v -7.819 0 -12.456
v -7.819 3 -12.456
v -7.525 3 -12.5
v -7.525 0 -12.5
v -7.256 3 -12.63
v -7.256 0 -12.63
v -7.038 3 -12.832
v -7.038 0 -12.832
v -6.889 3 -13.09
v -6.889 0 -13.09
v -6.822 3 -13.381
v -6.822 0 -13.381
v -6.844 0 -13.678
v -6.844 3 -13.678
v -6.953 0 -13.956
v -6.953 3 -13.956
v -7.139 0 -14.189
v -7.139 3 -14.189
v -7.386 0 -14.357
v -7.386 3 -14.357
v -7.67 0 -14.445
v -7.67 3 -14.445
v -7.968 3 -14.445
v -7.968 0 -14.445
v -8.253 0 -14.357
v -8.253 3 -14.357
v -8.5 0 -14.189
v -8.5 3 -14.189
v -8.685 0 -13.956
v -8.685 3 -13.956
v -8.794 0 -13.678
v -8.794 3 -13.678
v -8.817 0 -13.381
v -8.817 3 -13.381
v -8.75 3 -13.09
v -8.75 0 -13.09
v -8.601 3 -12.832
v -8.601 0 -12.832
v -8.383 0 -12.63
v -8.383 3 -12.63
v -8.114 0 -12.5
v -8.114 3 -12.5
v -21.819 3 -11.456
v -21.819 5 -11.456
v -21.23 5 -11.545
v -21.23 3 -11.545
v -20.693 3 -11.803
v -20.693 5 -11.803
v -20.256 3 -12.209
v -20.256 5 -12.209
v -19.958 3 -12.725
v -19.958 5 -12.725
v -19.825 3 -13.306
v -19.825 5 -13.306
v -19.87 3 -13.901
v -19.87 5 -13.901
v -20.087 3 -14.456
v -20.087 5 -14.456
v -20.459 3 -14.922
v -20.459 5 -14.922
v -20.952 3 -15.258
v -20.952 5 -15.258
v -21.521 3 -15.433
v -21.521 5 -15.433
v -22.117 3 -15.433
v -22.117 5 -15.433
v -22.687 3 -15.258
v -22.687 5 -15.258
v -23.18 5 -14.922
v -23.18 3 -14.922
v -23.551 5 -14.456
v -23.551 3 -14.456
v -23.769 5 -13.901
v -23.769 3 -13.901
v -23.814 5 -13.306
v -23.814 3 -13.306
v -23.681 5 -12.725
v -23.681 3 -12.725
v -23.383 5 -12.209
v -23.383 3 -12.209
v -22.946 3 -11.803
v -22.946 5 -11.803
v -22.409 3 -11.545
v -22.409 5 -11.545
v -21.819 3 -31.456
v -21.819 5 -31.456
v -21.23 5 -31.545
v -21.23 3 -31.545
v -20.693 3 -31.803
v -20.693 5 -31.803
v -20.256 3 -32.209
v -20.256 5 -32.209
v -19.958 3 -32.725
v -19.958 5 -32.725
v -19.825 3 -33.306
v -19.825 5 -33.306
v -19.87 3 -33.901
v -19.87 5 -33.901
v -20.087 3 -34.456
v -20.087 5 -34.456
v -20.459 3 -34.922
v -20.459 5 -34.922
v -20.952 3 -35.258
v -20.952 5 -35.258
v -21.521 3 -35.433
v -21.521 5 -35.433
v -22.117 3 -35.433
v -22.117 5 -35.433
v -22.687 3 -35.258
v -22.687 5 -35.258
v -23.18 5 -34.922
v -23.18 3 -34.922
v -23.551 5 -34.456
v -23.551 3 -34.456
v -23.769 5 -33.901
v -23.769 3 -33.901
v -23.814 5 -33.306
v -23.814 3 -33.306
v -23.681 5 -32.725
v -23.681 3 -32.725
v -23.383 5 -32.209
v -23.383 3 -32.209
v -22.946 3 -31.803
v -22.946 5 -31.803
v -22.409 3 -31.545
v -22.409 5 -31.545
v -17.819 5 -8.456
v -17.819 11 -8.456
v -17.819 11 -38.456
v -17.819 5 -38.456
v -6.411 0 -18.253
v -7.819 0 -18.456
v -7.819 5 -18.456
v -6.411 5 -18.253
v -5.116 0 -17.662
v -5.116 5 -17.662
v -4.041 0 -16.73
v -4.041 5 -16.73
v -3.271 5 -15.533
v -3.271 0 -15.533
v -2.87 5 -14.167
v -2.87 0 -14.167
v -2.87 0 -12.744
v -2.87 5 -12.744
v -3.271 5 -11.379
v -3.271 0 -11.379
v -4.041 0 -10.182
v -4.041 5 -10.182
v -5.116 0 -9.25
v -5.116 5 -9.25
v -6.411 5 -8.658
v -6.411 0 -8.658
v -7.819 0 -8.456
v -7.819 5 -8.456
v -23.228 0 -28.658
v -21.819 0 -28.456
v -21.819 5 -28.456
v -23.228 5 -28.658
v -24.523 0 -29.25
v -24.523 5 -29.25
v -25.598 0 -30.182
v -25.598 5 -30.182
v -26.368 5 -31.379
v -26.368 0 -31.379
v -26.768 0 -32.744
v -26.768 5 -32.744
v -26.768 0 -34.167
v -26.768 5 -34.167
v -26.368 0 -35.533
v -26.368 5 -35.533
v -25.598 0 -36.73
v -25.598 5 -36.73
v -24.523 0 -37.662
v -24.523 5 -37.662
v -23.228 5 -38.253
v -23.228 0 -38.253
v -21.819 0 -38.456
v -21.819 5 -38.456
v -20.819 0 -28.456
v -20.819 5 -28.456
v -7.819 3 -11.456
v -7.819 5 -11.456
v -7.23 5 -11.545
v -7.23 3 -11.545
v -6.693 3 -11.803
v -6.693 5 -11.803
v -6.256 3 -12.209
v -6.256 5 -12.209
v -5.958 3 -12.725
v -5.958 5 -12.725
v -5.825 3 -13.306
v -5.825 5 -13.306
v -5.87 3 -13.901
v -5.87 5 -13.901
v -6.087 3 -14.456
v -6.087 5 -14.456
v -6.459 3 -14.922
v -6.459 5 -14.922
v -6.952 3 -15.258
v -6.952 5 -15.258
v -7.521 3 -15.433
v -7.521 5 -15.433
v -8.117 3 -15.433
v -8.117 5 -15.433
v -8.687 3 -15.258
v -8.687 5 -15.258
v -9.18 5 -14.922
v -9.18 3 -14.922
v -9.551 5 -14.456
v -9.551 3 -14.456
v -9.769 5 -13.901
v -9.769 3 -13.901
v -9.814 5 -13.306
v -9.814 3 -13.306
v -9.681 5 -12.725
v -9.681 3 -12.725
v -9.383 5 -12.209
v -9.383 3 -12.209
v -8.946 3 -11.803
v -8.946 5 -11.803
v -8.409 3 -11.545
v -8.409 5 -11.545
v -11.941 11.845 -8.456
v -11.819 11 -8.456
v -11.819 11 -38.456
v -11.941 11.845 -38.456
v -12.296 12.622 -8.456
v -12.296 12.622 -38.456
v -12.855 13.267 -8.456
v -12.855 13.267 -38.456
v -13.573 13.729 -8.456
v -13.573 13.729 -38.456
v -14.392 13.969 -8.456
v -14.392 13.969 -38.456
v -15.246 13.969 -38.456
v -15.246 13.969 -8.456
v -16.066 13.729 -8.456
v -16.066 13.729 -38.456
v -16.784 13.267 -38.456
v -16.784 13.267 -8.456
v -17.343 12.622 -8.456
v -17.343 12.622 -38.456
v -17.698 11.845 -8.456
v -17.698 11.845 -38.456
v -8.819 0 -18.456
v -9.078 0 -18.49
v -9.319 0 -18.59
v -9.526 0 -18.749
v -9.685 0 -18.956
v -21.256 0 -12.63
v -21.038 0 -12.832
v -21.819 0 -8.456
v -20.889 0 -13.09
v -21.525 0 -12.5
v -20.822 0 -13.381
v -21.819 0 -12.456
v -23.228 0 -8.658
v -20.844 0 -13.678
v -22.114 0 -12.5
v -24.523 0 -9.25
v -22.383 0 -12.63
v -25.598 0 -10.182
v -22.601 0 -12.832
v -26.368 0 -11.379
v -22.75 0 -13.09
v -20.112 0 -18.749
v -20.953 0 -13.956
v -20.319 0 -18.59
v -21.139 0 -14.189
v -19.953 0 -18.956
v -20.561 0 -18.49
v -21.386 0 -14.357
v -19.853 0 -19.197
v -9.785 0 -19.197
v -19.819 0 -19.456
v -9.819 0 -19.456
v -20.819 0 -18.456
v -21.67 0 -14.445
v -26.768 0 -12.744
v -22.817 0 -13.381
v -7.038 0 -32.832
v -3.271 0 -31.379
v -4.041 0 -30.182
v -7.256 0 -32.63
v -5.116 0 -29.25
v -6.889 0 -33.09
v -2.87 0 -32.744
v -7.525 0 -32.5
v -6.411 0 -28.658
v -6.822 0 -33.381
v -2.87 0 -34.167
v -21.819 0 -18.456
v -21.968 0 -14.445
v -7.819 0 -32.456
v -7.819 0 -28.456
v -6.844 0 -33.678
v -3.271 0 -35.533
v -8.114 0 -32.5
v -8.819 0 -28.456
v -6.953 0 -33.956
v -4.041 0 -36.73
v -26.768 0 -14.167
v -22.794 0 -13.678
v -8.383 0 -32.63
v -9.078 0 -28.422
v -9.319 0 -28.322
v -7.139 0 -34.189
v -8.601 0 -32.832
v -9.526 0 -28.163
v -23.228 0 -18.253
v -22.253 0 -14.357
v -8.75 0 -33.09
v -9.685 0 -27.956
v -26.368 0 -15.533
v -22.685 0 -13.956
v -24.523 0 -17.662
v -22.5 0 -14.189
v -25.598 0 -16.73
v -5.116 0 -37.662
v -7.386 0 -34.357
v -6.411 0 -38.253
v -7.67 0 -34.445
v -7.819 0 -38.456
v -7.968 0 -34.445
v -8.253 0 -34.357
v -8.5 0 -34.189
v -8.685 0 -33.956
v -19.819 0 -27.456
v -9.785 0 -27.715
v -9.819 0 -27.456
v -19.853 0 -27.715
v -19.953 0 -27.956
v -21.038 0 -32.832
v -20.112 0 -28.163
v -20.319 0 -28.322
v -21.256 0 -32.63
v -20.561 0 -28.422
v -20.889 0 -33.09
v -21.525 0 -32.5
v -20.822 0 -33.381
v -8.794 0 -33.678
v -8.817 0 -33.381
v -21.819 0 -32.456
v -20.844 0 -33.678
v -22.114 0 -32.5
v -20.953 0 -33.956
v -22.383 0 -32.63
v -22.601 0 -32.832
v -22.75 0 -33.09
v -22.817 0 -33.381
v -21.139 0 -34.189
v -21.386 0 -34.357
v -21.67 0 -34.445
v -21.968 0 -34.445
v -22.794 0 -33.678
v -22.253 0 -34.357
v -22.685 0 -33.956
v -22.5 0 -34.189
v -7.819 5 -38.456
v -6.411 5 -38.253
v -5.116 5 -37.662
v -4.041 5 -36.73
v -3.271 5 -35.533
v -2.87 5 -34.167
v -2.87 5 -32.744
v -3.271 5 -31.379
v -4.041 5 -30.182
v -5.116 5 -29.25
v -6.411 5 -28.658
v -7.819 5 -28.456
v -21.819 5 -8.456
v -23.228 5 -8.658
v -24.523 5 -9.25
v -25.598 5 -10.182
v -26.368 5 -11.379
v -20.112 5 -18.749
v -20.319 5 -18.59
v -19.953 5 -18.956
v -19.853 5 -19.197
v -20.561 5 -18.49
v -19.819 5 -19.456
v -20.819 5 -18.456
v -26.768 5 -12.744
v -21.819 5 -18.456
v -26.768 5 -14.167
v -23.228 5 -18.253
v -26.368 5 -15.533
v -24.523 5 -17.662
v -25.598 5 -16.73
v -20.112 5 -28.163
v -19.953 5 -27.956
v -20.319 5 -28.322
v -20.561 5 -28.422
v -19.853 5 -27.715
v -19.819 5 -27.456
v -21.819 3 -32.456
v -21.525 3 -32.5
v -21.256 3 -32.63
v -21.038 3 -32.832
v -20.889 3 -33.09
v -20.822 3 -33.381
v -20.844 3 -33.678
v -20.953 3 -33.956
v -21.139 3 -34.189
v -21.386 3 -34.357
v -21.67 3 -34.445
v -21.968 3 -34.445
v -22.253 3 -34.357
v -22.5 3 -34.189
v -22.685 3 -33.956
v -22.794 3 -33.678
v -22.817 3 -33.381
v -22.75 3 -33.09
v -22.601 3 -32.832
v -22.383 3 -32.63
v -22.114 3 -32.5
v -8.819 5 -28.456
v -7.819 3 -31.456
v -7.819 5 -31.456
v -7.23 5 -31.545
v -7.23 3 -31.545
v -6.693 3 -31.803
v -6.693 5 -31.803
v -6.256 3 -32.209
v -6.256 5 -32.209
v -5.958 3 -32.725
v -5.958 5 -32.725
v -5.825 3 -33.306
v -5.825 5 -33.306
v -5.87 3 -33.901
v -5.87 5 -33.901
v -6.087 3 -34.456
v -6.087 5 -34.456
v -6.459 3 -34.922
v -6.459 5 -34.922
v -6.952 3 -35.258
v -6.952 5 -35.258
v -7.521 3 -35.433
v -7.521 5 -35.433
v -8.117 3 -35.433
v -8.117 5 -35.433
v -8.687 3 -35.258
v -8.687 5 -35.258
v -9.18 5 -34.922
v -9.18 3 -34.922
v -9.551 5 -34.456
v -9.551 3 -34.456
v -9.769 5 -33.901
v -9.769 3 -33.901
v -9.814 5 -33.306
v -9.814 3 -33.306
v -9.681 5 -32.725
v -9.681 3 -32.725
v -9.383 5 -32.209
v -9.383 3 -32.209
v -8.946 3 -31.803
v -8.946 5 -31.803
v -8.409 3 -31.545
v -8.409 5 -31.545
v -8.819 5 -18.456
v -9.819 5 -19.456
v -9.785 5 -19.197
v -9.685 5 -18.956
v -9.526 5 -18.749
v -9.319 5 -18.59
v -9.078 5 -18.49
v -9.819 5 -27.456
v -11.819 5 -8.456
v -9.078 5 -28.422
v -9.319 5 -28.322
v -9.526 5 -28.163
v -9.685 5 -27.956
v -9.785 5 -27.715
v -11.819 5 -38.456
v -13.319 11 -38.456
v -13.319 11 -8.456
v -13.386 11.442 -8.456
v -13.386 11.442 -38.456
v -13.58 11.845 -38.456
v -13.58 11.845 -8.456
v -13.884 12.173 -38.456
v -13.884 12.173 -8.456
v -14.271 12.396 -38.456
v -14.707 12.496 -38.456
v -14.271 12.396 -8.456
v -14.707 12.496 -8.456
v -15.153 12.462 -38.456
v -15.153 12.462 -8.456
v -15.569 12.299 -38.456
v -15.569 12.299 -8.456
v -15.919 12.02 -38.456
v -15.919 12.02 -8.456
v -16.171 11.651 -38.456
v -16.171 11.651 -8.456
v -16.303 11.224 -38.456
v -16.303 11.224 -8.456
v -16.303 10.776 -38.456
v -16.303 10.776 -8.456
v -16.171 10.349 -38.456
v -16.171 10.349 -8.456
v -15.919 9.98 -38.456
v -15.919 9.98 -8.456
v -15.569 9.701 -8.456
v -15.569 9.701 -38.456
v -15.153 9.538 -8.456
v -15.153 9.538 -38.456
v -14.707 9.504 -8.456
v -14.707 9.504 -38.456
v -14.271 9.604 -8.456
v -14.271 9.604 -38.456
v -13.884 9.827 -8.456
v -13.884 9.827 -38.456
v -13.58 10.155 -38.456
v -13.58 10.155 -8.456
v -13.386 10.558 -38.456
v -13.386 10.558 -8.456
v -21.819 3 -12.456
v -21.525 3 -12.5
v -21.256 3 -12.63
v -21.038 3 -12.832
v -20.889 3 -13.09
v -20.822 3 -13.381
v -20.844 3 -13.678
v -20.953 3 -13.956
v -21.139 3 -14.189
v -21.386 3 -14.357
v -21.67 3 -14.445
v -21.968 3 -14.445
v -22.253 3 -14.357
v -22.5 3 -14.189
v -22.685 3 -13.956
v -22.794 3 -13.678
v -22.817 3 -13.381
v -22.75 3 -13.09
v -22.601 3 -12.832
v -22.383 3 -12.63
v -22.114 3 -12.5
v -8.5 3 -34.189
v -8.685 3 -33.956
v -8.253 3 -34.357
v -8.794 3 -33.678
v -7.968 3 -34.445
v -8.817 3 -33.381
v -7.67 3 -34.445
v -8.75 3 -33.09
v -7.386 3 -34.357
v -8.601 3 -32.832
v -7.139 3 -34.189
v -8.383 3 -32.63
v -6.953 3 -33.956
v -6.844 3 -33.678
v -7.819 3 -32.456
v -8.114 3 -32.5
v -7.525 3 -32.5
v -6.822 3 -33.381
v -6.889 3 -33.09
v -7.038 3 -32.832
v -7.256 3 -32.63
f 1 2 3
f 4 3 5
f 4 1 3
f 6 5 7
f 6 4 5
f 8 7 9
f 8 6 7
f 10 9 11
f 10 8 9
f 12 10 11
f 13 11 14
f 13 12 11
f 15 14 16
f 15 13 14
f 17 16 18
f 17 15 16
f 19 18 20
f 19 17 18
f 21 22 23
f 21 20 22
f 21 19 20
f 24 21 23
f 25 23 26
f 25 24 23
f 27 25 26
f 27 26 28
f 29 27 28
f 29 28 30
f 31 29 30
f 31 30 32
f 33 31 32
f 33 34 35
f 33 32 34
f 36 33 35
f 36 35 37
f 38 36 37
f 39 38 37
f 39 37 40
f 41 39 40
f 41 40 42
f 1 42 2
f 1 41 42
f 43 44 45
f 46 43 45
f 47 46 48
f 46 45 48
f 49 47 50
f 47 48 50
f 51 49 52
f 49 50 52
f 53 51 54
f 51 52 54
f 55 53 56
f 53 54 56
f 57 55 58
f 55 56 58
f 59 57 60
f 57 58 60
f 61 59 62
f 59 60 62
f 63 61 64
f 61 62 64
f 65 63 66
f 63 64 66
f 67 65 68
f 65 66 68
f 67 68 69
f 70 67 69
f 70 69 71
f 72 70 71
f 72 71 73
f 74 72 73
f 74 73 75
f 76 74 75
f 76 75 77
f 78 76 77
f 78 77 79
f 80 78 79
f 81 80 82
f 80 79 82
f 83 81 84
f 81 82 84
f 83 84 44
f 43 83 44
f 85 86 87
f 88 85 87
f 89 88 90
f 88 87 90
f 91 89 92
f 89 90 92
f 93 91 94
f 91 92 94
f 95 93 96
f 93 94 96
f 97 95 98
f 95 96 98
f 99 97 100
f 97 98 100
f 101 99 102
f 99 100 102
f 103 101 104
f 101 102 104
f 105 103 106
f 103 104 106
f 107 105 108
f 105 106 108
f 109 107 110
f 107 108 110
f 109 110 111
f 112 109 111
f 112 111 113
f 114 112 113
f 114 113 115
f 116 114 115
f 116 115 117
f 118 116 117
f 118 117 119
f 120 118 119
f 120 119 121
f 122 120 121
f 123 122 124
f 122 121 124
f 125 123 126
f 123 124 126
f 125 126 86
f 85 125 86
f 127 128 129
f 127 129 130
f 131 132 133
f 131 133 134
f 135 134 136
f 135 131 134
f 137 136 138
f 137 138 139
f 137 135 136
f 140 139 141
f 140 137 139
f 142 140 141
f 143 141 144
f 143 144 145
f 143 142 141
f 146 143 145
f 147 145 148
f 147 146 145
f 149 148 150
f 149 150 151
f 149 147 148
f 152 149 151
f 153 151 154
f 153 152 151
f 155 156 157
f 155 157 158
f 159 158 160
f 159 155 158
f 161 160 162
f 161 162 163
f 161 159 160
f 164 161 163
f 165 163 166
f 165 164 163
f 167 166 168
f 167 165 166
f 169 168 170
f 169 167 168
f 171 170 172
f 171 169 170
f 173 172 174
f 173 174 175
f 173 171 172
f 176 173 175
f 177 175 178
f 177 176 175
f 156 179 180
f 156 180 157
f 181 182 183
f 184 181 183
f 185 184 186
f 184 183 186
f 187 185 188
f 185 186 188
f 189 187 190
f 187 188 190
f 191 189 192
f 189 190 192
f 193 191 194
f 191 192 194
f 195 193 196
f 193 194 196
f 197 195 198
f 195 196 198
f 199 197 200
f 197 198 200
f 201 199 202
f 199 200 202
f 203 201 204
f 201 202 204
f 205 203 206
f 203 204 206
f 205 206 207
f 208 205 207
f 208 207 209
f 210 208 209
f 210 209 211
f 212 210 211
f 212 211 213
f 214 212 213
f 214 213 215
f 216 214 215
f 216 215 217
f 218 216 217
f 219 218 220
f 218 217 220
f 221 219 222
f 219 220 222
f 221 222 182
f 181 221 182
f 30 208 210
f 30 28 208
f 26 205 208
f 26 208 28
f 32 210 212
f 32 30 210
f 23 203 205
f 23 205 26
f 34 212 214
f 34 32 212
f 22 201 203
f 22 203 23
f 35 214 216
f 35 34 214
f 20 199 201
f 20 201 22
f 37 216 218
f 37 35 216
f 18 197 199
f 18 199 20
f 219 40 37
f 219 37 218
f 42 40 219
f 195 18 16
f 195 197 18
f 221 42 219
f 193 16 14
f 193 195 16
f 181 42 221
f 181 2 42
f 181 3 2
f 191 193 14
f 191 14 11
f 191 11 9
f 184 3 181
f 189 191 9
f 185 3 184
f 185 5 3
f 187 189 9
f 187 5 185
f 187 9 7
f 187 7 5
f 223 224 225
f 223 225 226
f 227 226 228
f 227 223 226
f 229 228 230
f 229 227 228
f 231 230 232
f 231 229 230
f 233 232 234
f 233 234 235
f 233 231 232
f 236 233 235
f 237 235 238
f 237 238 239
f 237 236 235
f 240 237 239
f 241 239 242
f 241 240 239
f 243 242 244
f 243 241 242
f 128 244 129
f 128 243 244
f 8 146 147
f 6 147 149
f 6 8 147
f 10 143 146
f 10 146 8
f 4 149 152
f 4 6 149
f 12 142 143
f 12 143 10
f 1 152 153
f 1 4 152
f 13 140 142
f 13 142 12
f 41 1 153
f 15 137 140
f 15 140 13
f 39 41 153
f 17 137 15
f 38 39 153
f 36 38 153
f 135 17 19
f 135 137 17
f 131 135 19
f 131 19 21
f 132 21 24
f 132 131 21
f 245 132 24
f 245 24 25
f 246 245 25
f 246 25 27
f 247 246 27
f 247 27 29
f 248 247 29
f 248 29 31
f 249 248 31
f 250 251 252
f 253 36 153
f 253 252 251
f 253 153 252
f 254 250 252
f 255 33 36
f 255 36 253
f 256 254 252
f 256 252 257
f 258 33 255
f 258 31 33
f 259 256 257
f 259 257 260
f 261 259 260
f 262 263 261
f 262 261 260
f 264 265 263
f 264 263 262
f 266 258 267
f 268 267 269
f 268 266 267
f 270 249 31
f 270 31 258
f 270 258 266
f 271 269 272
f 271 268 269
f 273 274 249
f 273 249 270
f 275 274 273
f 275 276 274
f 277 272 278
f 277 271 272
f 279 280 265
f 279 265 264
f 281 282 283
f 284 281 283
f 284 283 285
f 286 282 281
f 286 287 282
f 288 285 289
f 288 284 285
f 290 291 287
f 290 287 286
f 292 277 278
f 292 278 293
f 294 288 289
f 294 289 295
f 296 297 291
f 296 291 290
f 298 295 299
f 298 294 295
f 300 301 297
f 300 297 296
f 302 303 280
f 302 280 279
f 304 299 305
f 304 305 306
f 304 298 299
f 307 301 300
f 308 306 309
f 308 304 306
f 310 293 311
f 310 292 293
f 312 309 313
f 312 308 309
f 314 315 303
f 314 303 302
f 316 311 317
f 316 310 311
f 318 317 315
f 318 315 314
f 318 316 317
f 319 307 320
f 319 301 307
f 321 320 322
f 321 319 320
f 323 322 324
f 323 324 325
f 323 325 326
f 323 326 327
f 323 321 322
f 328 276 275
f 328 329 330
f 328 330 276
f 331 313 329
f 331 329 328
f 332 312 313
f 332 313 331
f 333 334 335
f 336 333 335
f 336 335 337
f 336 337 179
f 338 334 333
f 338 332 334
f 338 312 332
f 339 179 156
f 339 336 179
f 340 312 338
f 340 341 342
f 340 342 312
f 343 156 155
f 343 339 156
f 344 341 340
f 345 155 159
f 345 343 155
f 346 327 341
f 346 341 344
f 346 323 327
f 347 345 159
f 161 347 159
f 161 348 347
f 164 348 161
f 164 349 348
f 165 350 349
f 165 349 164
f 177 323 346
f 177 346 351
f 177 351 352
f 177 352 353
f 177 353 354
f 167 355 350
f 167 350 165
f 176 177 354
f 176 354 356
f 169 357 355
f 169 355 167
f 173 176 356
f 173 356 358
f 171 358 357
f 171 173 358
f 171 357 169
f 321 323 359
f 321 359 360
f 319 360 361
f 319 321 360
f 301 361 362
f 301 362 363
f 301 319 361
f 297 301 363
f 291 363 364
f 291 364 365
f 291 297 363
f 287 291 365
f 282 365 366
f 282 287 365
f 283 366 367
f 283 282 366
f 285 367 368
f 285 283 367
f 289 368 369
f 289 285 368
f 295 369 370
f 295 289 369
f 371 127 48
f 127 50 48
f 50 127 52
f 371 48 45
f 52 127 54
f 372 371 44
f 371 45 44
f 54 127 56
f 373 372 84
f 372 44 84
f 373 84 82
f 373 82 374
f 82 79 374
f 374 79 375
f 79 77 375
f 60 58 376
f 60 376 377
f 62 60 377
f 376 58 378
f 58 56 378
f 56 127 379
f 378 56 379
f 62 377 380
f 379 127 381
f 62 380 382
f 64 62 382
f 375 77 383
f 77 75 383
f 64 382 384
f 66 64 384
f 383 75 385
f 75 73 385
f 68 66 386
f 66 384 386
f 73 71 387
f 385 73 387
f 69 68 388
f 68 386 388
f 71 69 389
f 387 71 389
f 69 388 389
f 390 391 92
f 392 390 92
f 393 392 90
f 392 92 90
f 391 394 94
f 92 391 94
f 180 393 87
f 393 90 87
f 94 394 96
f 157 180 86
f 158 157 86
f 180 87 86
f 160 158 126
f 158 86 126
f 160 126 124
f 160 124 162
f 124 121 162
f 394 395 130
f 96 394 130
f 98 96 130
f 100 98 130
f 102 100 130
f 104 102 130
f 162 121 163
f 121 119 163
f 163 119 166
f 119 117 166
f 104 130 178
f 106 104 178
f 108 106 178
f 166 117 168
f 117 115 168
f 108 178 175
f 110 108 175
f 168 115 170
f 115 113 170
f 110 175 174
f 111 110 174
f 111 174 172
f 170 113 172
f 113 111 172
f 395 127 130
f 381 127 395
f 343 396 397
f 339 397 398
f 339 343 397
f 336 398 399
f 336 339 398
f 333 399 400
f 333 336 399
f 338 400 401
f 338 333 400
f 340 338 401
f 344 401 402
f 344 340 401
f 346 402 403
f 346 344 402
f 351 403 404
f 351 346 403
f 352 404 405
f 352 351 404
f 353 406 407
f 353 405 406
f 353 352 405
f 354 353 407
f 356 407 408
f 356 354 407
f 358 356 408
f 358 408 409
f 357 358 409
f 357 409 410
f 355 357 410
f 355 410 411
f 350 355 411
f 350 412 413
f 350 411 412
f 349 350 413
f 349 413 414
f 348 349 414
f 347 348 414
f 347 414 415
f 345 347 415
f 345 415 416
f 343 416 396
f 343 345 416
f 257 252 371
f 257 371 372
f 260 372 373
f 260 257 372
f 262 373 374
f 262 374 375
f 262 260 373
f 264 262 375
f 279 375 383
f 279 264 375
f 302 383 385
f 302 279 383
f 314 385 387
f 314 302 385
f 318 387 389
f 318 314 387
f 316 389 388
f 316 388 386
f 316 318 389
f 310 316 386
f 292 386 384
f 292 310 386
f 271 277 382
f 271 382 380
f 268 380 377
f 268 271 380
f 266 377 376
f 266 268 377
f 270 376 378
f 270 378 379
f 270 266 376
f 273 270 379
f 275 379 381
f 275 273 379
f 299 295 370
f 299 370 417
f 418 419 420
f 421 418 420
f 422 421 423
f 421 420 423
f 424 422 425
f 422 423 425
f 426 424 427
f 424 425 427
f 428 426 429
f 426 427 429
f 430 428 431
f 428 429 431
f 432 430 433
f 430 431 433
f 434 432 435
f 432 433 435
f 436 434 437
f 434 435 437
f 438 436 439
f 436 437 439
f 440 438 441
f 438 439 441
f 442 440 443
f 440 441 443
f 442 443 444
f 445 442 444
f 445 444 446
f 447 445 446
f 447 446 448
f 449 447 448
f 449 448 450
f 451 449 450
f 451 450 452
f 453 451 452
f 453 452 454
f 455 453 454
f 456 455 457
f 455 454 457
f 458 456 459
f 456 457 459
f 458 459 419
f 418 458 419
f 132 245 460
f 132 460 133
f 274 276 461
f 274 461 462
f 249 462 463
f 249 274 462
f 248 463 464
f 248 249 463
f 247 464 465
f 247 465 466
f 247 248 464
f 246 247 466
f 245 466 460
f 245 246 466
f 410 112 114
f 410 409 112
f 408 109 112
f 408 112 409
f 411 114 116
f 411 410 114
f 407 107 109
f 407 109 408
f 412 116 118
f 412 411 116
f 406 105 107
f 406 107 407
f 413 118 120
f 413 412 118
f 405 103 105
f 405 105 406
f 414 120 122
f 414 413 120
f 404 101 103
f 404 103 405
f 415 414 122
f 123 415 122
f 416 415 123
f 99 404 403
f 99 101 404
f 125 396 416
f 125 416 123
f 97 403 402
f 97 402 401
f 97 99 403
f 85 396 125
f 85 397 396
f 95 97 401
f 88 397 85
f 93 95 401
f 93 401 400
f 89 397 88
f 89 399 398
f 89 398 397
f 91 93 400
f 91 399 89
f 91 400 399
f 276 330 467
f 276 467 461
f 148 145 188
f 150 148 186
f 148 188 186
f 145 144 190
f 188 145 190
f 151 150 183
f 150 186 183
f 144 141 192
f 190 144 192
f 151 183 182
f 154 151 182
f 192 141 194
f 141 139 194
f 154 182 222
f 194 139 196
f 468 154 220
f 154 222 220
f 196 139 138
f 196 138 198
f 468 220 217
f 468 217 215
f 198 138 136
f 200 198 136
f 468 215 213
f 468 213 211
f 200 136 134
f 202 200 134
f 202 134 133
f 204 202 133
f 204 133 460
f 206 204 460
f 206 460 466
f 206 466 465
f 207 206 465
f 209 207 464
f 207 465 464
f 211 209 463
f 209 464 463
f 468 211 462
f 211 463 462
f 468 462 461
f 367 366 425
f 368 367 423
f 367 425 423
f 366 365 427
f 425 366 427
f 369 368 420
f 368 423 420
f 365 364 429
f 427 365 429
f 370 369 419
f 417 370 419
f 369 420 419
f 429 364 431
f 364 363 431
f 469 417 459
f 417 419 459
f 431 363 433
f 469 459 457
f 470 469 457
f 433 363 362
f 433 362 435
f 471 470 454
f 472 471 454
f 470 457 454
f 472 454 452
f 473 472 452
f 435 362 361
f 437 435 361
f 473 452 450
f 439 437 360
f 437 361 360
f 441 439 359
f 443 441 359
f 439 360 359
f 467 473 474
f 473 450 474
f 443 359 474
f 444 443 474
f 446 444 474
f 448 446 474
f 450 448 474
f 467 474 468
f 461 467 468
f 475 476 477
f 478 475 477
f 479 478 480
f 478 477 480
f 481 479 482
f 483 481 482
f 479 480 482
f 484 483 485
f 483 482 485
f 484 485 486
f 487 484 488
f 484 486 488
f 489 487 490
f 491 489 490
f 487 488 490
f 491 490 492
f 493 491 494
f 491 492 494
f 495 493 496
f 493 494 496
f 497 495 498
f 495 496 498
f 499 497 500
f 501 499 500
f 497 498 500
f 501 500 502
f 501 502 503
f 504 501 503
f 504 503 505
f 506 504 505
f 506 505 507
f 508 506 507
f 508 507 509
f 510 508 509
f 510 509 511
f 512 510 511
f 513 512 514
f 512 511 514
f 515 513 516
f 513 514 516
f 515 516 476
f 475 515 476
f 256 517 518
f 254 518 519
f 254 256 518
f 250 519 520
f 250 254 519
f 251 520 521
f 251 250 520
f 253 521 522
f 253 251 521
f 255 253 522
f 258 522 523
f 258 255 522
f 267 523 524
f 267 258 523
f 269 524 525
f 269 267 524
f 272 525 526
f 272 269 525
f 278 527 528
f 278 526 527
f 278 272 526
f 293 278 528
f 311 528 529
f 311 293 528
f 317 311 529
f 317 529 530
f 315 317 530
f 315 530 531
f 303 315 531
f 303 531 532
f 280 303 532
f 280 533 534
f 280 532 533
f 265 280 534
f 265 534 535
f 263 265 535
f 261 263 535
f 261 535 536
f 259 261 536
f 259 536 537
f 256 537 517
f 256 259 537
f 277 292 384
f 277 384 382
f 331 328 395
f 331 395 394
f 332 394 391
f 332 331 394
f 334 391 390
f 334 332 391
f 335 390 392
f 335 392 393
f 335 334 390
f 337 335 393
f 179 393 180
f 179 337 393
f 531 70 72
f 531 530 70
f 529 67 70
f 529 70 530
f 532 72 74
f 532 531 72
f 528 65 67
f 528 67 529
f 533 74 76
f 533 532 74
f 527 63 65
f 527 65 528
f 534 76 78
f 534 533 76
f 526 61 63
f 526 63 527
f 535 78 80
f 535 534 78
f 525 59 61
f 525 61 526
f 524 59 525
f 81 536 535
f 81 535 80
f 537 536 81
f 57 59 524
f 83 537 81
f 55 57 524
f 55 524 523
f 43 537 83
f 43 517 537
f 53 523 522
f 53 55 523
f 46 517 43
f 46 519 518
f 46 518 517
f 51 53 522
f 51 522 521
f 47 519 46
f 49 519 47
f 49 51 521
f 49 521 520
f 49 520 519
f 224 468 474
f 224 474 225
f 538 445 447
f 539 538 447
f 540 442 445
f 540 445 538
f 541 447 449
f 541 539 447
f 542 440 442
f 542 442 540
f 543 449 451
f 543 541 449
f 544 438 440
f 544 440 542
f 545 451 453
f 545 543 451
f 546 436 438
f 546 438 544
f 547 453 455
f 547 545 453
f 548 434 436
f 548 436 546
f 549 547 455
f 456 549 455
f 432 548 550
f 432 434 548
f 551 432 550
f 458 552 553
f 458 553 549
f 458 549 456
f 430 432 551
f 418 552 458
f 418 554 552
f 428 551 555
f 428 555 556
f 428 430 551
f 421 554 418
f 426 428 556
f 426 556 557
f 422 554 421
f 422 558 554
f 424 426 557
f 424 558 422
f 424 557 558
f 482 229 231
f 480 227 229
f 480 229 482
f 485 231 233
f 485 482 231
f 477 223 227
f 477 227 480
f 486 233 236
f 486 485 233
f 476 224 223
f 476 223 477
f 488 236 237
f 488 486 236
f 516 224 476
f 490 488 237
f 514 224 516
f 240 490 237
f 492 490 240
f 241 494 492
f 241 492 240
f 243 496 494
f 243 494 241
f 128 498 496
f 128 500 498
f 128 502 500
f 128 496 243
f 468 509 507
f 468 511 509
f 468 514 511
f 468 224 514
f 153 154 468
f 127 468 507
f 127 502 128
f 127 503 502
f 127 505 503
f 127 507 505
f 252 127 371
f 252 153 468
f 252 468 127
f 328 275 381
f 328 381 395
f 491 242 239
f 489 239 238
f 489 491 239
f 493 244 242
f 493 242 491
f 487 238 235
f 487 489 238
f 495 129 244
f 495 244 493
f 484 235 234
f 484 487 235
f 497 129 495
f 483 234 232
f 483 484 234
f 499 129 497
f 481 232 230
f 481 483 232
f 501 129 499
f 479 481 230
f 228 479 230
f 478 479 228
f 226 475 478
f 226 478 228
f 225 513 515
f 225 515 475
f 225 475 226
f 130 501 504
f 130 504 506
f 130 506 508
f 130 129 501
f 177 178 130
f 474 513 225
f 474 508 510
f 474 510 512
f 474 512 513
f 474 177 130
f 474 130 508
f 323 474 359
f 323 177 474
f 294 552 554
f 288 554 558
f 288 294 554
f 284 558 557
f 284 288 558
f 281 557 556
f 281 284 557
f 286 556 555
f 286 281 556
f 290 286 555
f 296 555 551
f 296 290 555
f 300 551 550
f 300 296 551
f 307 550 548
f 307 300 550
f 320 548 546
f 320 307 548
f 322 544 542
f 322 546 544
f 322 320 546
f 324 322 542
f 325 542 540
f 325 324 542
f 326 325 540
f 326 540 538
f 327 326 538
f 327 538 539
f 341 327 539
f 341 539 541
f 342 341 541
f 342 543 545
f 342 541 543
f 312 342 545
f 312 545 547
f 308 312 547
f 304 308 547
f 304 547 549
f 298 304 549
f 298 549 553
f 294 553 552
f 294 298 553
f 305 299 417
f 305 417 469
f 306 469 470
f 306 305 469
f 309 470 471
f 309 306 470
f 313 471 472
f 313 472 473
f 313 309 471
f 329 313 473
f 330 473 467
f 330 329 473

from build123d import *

# Parameters (mm, degrees)
SKETCH_1_R          = 1
EXTRUDE_1_DEPTH     = 5
SKETCH_7_R          = 1.5
EXTRUDE_3_DEPTH     = 30
SKETCH_8_R          = 2
CUT_EXTRUDE_1_DEPTH = 2


with BuildPart() as part:
    # 草图1 → 凸台-拉伸1 (new body)
    with BuildSketch(Plane(origin=(0, 0, 0), x_dir=(1, 0, 0), z_dir=(0, 1, 0))):
        with BuildLine():
            Line((-21.819389518, 18.45581381), (-20.819389518, 18.45581381))
            ThreePointArc((-20.819389518, 18.45581381), (-20.112282737, 18.748707029), (-19.819389518, 19.45581381))
            Line((-19.819389518, 19.45581381), (-19.819389518, 27.45581381))
            ThreePointArc((-19.819389518, 27.45581381), (-20.112282737, 28.162920591), (-20.819389518, 28.45581381))
            Line((-20.819389518, 28.45581381), (-21.819389518, 28.45581381))
            ThreePointArc((-21.819389518, 28.45581381), (-26.819389518, 33.45581381), (-21.819389518, 38.45581381))
            Line((-21.819389518, 38.45581381), (-7.819389518, 38.45581381))
            ThreePointArc((-7.819389518, 38.45581381), (-2.819389518, 33.45581381), (-7.819389518, 28.45581381))
            Line((-7.819389518, 28.45581381), (-8.819389518, 28.45581381))
            ThreePointArc((-8.819389518, 28.45581381), (-9.526496299, 28.162920591), (-9.819389518, 27.45581381))
            Line((-9.819389518, 27.45581381), (-9.819389518, 19.45581381))
            ThreePointArc((-9.819389518, 19.45581381), (-9.526496299, 18.748707029), (-8.819389518, 18.45581381))
            Line((-8.819389518, 18.45581381), (-7.819389518, 18.45581381))
            ThreePointArc((-7.819389518, 18.45581381), (-2.819389518, 13.45581381), (-7.819389518, 8.45581381))
            Line((-7.819389518, 8.45581381), (-21.819389518, 8.45581381))
            ThreePointArc((-21.819389518, 8.45581381), (-26.819389518, 13.45581381), (-21.819389518, 18.45581381))
        make_face()
        with Locations(Location((-21.819389518, 13.45581381, 0), (0, 0, 270))):
            Circle(SKETCH_1_R, mode=Mode.SUBTRACT)
        with Locations(Location((-7.819389518, 13.45581381, 0), (0, 0, 270))):
            Circle(SKETCH_1_R, mode=Mode.SUBTRACT)
        with Locations(Location((-21.819389518, 33.45581381, 0), (0, 0, 270))):
            Circle(SKETCH_1_R, mode=Mode.SUBTRACT)
        with Locations(Location((-7.819389518, 33.45581381, 0), (0, 0, 270))):
            Circle(SKETCH_1_R, mode=Mode.SUBTRACT)
    extrude(amount=EXTRUDE_1_DEPTH)

    # 草图7 → 凸台-拉伸3 (add)
    with BuildSketch(Plane.XY.offset(-8.45581381)):
        with BuildLine():
            Line((-17.819389518, 11), (-17.819389518, 5))
            Line((-17.819389518, 5), (-11.819389518, 5))
            Line((-11.819389518, 5), (-11.819389518, 11))
            ThreePointArc((-11.819389518, 11), (-14.819389518, 14), (-17.819389518, 11))
        make_face()
        with Locations((-14.819389518, 11)):
            Circle(SKETCH_7_R, mode=Mode.SUBTRACT)
    extrude(amount=-EXTRUDE_3_DEPTH)

    # 草图8 → 切除-拉伸1 (cut)
    with BuildSketch(Plane(origin=(0, 5, 0), x_dir=(1, 0, 0), z_dir=(0, 1, 0))):
        with Locations(Location((-21.819389518, 33.45581381, 0), (0, 0, 270))):
            Circle(SKETCH_8_R)
        with Locations(Location((-7.819389518, 33.45581381, 0), (0, 0, 270))):
            Circle(SKETCH_8_R)
        with Locations(Location((-21.819389518, 13.45581381, 0), (0, 0, 270))):
            Circle(SKETCH_8_R)
        with Locations(Location((-7.819389518, 13.45581381, 0), (0, 0, 270))):
            Circle(SKETCH_8_R)
    extrude(amount=-CUT_EXTRUDE_1_DEPTH, mode=Mode.SUBTRACT)


solid = part.part
